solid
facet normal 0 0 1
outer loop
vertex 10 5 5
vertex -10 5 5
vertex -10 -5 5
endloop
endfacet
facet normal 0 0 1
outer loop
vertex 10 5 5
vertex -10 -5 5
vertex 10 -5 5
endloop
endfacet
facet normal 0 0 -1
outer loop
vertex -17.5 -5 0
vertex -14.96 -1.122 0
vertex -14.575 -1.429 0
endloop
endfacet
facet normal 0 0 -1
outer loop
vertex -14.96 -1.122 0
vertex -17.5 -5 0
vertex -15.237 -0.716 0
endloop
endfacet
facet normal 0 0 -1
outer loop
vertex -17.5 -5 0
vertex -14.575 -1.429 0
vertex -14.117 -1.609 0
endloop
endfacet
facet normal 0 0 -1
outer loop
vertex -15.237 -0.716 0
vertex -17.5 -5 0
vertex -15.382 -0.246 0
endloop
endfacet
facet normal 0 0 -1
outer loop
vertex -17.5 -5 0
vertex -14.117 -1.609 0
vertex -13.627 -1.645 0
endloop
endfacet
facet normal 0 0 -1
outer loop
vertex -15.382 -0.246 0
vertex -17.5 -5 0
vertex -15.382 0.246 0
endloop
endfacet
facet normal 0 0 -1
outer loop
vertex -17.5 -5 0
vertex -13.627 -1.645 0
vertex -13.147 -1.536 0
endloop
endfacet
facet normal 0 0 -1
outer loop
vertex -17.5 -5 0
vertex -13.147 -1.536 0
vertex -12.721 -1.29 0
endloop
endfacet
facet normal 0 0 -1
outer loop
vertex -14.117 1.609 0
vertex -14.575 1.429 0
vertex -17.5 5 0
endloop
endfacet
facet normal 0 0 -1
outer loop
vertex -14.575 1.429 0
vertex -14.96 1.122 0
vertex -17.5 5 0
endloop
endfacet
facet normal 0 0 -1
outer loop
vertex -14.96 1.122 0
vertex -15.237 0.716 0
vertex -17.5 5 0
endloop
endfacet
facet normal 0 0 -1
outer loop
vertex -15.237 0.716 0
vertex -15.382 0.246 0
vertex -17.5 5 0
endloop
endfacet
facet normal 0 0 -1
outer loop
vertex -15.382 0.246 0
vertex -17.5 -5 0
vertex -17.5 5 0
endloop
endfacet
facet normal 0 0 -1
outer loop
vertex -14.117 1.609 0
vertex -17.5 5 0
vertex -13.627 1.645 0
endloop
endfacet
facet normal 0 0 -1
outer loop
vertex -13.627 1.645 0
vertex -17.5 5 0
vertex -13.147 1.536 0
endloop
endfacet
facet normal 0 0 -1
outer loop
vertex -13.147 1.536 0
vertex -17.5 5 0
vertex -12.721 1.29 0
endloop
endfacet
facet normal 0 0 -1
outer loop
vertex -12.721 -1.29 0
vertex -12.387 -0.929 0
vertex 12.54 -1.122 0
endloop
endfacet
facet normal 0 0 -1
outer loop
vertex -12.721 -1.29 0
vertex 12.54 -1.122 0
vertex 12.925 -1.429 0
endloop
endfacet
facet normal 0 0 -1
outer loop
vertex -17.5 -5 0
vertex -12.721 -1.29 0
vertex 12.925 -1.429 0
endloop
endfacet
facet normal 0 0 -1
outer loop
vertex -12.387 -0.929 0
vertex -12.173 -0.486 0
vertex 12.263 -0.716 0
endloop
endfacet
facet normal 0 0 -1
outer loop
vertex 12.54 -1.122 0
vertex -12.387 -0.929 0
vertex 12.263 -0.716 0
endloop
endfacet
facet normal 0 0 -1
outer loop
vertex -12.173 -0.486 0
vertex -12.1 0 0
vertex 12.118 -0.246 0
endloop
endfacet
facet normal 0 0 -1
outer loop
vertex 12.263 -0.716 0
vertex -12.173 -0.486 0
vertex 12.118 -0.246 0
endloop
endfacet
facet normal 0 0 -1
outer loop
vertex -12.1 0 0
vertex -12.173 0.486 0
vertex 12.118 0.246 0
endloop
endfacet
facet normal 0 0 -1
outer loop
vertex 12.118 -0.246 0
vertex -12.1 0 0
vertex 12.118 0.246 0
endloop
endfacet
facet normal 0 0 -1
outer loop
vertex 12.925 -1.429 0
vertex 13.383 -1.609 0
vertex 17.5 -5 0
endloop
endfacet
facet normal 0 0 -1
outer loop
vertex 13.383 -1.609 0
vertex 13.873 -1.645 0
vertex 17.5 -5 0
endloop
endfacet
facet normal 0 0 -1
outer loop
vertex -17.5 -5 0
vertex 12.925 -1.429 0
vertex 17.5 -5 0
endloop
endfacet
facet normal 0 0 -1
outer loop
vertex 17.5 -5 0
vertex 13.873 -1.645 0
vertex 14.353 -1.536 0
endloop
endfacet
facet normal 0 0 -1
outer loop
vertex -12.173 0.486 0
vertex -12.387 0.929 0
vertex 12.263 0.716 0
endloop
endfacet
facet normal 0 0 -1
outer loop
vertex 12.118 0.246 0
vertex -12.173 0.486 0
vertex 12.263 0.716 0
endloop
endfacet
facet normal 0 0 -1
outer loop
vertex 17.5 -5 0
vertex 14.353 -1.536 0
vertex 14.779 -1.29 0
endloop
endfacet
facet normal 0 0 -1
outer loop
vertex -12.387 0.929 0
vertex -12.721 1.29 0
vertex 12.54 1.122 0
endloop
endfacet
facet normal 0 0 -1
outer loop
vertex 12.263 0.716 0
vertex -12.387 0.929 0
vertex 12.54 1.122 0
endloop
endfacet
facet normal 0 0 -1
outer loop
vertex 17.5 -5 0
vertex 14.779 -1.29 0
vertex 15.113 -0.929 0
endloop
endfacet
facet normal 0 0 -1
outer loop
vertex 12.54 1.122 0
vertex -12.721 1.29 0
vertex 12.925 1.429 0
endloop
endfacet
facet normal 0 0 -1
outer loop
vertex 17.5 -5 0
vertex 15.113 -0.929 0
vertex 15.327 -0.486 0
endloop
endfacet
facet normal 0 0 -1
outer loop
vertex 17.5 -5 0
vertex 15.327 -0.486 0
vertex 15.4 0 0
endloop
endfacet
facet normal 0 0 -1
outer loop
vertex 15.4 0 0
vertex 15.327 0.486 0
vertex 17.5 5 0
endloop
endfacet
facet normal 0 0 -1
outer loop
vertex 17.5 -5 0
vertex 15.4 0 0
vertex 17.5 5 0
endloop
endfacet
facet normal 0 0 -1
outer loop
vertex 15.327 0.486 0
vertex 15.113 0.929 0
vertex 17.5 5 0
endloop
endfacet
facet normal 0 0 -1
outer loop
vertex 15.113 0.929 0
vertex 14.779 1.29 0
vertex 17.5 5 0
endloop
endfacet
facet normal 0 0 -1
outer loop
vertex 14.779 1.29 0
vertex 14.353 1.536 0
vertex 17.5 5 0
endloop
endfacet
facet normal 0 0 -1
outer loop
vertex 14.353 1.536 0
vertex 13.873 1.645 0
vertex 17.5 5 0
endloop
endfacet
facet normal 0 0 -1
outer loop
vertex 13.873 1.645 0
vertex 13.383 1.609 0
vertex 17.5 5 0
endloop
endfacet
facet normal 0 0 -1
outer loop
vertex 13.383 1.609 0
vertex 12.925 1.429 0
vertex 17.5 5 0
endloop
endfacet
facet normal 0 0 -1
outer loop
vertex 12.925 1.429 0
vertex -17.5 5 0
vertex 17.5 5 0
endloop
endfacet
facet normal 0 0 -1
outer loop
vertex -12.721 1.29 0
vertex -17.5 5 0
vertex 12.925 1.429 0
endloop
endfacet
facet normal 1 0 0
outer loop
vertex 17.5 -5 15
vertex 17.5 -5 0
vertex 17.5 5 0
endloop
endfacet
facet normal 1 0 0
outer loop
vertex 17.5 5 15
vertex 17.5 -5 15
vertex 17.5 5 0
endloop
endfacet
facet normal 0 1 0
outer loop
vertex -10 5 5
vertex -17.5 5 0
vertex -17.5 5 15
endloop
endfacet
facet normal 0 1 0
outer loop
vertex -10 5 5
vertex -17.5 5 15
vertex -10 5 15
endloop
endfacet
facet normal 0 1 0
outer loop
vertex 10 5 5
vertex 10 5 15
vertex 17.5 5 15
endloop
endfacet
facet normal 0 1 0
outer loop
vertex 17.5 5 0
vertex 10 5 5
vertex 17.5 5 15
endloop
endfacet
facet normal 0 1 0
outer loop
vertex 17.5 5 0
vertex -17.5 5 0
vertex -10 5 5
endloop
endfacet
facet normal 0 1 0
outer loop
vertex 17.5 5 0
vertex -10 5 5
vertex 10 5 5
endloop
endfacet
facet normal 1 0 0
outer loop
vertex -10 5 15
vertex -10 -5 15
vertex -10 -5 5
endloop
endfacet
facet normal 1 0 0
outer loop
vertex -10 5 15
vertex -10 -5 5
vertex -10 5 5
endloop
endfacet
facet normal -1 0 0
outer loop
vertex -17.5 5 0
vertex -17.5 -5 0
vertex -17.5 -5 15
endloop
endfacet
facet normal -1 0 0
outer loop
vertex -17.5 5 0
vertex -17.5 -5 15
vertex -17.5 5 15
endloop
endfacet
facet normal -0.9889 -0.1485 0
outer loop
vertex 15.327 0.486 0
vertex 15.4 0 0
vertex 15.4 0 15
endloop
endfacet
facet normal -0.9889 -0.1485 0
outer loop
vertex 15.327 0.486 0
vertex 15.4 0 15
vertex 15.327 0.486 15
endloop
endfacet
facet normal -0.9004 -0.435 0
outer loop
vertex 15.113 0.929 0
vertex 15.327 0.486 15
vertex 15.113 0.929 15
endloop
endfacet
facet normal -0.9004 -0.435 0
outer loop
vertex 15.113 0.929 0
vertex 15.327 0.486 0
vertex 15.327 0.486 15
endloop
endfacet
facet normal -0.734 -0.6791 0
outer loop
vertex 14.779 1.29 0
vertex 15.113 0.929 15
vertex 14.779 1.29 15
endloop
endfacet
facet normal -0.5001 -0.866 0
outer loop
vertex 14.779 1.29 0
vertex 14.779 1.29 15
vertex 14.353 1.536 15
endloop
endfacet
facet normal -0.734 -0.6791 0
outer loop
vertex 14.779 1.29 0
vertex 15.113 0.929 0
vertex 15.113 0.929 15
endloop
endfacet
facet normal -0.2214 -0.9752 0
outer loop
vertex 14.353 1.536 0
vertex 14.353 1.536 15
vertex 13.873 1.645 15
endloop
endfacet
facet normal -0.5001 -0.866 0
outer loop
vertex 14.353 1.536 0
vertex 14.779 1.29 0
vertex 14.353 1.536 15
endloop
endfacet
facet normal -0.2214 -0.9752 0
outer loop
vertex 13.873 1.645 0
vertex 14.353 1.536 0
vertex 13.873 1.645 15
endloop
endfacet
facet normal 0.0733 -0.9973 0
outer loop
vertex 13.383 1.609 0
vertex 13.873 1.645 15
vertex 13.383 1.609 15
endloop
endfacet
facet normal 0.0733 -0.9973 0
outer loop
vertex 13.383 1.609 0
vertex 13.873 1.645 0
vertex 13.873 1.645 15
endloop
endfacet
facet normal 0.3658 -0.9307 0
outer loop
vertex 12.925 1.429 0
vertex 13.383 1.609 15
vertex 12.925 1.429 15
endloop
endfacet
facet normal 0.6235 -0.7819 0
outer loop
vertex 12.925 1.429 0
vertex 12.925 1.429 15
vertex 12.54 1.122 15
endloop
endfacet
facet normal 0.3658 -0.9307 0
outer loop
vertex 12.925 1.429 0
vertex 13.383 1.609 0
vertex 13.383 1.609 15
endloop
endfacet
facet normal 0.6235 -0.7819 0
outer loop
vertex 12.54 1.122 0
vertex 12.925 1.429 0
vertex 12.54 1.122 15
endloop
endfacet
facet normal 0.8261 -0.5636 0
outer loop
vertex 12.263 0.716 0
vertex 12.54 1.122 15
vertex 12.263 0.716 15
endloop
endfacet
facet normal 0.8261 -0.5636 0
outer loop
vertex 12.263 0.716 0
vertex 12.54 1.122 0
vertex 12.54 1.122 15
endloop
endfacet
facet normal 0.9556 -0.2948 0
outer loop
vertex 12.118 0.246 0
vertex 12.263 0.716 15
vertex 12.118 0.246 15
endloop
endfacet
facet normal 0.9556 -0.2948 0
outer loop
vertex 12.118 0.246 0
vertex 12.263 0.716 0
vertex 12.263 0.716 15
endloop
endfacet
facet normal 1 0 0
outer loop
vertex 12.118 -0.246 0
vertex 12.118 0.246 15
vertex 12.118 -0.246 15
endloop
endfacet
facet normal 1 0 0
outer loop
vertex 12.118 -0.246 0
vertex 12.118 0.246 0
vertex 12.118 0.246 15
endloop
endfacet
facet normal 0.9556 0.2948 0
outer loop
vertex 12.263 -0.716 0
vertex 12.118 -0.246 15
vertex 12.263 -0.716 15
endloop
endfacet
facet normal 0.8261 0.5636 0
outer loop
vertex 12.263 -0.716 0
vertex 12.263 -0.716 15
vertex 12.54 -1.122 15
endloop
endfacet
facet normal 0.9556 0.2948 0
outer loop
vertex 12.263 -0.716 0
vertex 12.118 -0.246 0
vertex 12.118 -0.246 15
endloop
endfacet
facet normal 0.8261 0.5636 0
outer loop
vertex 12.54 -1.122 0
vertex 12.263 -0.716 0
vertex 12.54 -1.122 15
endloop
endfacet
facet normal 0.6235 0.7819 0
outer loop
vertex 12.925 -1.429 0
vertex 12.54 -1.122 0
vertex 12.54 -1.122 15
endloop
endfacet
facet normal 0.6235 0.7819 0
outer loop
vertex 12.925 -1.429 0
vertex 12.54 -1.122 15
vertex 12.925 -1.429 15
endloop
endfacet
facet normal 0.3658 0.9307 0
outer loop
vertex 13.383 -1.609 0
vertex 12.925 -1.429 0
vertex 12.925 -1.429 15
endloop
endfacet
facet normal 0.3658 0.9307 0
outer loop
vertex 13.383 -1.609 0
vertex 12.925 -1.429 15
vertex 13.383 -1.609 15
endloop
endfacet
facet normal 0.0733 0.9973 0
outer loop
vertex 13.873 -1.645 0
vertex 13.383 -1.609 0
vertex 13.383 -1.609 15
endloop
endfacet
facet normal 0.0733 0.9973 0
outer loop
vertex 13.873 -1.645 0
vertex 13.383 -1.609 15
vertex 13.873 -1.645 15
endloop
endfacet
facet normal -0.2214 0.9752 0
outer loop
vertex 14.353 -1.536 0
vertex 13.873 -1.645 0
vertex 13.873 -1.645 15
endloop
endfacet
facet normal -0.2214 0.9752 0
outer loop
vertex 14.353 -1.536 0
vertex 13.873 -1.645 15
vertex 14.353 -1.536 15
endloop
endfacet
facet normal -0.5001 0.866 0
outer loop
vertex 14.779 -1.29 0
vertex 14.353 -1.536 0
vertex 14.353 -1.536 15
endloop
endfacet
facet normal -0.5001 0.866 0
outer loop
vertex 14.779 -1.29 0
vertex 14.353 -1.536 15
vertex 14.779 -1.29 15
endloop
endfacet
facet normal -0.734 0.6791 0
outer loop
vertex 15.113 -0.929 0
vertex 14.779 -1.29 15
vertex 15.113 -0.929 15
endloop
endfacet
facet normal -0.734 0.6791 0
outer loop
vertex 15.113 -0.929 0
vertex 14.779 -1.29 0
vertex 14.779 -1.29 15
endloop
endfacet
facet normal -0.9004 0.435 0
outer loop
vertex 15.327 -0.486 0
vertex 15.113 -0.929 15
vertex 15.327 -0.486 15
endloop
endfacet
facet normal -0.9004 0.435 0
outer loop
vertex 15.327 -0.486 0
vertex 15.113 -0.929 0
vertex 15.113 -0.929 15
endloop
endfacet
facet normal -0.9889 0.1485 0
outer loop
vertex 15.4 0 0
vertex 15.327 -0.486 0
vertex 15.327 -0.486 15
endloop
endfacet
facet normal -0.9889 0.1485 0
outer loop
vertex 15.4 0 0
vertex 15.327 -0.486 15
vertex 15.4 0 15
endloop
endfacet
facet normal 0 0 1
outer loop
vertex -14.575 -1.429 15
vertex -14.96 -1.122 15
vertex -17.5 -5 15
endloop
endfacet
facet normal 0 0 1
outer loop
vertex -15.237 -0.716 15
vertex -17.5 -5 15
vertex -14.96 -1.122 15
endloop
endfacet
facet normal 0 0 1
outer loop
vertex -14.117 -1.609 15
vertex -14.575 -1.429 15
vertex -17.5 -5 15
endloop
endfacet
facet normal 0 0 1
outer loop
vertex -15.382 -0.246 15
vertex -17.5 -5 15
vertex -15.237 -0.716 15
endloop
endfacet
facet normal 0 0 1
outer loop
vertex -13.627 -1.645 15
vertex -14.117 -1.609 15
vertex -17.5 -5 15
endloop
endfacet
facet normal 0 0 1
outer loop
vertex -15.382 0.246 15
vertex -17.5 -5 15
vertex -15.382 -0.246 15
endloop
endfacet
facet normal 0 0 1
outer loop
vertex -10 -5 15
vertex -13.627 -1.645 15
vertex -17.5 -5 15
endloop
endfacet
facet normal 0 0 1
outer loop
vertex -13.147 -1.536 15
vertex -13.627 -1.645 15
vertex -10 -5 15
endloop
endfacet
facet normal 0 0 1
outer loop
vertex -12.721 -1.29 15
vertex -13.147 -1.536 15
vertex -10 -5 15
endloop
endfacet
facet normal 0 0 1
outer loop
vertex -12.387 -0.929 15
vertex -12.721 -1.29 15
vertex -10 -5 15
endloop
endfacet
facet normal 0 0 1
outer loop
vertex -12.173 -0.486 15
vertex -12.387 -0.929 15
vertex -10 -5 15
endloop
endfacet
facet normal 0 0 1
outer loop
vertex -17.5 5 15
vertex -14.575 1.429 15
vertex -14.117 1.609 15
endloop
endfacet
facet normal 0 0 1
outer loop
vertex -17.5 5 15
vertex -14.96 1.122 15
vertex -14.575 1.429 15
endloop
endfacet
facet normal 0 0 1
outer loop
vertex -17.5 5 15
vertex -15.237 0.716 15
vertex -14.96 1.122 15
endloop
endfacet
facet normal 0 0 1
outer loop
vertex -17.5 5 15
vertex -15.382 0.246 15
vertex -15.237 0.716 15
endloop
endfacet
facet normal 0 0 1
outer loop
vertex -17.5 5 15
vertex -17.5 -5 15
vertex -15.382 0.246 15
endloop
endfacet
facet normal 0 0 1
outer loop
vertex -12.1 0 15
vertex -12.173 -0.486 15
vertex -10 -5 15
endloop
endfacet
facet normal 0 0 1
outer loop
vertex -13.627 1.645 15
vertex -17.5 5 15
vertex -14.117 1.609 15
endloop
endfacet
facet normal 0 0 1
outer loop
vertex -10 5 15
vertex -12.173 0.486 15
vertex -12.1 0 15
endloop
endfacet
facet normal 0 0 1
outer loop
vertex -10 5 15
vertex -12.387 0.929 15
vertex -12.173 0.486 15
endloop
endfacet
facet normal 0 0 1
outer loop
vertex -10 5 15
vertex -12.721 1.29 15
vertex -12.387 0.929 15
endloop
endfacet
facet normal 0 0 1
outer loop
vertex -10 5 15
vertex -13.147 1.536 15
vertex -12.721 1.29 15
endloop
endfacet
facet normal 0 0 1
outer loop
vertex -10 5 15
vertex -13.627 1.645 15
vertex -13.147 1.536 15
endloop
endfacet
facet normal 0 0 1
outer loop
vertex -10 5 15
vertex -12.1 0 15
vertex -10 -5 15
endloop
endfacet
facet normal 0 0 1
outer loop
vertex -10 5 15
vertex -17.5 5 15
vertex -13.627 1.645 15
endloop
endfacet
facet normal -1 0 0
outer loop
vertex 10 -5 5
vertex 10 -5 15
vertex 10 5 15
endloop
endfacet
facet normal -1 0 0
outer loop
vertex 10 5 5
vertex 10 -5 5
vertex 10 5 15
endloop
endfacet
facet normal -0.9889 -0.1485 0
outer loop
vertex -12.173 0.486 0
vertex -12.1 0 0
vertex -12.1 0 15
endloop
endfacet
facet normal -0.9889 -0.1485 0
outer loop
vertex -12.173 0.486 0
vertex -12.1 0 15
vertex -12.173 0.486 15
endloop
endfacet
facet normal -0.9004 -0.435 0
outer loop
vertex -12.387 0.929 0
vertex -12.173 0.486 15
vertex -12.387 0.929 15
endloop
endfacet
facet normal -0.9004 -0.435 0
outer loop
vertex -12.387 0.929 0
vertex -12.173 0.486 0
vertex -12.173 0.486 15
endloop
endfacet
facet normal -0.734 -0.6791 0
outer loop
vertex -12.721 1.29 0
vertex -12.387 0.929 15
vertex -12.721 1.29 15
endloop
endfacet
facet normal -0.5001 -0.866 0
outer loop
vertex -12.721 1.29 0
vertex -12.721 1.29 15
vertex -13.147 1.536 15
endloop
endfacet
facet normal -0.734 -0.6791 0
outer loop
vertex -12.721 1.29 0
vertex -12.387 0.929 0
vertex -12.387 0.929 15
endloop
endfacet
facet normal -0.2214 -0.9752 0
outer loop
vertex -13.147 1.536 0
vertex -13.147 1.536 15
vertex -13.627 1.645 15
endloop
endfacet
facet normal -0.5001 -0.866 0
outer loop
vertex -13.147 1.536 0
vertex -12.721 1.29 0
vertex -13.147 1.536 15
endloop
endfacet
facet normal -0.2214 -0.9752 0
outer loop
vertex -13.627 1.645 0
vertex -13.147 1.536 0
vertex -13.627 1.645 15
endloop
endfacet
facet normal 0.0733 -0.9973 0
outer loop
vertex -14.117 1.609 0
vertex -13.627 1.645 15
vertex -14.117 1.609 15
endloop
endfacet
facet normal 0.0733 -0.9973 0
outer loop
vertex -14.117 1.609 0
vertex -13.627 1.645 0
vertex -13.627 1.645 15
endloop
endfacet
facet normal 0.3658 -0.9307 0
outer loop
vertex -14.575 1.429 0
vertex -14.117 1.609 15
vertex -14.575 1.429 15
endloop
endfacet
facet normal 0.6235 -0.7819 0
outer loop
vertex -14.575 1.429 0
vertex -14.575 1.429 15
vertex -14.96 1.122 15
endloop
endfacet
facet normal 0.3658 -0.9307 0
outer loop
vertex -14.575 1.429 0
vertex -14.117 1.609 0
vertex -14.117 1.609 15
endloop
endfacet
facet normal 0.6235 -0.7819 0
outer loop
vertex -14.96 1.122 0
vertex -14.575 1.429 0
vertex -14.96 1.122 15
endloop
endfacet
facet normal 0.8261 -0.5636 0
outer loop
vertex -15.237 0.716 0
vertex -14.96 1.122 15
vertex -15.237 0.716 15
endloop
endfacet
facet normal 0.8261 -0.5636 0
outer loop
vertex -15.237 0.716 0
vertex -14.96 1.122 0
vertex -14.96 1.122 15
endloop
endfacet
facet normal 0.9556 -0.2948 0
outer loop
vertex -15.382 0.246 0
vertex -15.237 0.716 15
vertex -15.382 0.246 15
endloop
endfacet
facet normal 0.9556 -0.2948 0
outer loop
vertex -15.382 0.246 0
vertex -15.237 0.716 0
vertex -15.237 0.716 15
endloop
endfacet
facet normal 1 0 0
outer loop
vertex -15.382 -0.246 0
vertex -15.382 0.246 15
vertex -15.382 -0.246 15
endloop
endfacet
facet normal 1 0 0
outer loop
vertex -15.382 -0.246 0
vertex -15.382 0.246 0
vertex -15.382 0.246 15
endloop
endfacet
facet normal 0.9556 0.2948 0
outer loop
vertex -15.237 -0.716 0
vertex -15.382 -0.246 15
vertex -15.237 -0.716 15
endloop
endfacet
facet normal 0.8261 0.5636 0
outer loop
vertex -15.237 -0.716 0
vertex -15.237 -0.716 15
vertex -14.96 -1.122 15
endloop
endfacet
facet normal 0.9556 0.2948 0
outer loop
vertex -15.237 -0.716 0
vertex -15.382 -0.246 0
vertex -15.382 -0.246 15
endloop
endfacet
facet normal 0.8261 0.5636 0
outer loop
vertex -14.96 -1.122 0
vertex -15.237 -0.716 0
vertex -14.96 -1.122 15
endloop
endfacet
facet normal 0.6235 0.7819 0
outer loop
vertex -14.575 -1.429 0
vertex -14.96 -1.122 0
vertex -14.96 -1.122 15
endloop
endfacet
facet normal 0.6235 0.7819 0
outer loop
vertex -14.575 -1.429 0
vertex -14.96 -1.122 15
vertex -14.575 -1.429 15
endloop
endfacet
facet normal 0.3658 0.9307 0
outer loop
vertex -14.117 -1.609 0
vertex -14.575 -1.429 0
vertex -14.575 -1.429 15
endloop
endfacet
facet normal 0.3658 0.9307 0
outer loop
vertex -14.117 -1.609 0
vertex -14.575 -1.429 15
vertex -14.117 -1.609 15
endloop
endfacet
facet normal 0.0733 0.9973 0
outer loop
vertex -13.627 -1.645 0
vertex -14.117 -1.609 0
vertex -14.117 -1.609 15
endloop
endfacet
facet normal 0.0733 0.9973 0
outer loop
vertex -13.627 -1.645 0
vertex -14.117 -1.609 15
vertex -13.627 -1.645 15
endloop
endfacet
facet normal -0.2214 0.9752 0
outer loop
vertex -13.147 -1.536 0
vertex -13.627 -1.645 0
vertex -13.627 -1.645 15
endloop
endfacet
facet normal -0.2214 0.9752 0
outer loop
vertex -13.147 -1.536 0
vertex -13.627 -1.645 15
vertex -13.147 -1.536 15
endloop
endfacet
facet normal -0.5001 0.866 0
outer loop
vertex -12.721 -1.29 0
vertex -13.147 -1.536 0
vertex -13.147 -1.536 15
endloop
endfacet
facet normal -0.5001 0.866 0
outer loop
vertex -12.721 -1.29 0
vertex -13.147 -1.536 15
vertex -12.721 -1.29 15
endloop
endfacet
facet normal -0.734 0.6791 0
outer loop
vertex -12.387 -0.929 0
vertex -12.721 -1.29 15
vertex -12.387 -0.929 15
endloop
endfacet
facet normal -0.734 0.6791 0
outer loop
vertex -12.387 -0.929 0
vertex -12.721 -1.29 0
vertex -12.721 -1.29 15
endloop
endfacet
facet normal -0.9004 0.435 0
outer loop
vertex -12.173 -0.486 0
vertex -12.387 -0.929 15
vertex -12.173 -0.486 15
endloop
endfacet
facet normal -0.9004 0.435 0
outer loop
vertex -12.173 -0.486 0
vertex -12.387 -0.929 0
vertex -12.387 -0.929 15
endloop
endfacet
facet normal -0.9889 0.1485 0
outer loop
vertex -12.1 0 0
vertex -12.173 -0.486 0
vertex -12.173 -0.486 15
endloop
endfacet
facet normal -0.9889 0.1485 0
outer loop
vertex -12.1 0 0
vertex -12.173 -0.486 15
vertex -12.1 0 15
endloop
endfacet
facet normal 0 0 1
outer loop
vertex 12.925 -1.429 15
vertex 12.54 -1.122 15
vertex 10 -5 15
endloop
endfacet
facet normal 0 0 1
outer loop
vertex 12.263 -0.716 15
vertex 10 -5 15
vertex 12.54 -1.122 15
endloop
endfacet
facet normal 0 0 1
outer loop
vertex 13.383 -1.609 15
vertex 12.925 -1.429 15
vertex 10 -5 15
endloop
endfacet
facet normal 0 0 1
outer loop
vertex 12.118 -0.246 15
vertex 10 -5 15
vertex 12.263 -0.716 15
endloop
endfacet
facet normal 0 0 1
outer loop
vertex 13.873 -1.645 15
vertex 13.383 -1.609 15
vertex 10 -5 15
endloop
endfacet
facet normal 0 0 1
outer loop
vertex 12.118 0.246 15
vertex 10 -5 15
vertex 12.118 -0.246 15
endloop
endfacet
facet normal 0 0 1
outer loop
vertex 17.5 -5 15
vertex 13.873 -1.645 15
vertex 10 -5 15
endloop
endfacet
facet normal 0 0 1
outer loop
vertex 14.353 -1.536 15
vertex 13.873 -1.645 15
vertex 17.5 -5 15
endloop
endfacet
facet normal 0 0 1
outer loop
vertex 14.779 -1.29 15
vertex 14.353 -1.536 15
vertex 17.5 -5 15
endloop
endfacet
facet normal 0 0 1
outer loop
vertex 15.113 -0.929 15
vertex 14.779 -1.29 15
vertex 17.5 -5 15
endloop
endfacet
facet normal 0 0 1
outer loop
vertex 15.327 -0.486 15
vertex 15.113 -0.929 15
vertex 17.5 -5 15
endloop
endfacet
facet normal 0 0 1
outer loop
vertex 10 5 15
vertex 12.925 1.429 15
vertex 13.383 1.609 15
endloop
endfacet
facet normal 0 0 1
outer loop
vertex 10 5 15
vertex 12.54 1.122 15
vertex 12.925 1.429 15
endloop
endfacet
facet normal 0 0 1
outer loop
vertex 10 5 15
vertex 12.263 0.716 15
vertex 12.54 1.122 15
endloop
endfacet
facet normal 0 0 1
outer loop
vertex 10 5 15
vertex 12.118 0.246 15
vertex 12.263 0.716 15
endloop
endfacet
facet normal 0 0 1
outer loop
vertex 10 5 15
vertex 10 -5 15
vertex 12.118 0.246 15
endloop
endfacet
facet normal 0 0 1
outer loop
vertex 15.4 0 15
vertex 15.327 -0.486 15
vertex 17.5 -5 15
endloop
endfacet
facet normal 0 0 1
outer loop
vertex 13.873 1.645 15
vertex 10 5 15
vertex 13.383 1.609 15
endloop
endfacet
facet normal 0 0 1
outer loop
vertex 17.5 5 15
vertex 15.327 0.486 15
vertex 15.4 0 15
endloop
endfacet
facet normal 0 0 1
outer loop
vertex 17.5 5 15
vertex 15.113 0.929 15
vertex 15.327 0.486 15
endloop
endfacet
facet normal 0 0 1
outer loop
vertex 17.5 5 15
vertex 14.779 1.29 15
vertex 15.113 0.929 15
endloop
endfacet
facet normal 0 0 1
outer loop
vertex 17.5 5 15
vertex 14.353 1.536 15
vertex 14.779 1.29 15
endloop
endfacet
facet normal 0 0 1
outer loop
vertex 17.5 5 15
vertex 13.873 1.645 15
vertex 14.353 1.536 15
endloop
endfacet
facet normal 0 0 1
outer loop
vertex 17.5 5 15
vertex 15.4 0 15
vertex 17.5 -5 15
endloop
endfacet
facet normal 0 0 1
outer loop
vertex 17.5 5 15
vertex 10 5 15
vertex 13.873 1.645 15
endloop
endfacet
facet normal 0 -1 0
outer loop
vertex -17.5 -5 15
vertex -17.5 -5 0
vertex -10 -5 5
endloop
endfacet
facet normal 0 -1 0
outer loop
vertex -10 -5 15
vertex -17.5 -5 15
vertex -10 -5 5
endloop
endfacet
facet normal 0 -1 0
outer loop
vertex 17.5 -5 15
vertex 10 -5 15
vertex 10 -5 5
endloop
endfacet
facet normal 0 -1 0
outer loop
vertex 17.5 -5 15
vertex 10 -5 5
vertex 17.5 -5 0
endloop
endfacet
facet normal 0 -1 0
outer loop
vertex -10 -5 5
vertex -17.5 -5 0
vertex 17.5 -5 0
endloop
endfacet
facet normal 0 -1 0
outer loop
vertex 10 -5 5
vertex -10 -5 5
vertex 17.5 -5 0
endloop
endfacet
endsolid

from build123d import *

# Parameters (mm, degrees)
SKETCH1_W           = 35
SKETCH1_H           = 10
SKETCH1_R           = 1.65
BOSS_EXTRUDE1_DEPTH = 15
SKETCH2_W           = 20
SKETCH2_H           = 10
CUT_EXTRUDE1_DEPTH  = 10


with BuildPart() as part:
    # Sketch1 → Boss-Extrude1 (new body)
    with BuildSketch(Plane.XY):
        Rectangle(SKETCH1_W, SKETCH1_H)
        with Locations((-13.75, 0)):
            Circle(SKETCH1_R, mode=Mode.SUBTRACT)
        with Locations((13.75, 0)):
            Circle(SKETCH1_R, mode=Mode.SUBTRACT)
    extrude(amount=BOSS_EXTRUDE1_DEPTH)

    # Sketch2 → Cut-Extrude1 (cut)
    with BuildSketch(Plane.XY.offset(15)):
        Rectangle(SKETCH2_W, SKETCH2_H)
    extrude(amount=-CUT_EXTRUDE1_DEPTH, mode=Mode.SUBTRACT)


solid = part.part
